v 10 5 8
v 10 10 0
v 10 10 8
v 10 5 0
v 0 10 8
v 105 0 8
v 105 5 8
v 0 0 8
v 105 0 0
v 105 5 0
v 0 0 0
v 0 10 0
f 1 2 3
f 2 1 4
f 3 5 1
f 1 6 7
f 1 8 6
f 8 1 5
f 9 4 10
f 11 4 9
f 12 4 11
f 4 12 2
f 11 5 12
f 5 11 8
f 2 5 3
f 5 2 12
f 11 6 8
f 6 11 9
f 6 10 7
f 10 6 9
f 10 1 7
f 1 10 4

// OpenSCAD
// Dimensions
box_width = 10; // in mm
box_height = 10; // in mm
box_depth = 8; // in mm
handle_length = 100; // in mm
handle_width = 5; // in mm

// Box
cube([box_width, box_height, box_depth]);

// Handle
translate([box_width/2, 0, 0])
   cube([handle_length, handle_width, box_depth]);
